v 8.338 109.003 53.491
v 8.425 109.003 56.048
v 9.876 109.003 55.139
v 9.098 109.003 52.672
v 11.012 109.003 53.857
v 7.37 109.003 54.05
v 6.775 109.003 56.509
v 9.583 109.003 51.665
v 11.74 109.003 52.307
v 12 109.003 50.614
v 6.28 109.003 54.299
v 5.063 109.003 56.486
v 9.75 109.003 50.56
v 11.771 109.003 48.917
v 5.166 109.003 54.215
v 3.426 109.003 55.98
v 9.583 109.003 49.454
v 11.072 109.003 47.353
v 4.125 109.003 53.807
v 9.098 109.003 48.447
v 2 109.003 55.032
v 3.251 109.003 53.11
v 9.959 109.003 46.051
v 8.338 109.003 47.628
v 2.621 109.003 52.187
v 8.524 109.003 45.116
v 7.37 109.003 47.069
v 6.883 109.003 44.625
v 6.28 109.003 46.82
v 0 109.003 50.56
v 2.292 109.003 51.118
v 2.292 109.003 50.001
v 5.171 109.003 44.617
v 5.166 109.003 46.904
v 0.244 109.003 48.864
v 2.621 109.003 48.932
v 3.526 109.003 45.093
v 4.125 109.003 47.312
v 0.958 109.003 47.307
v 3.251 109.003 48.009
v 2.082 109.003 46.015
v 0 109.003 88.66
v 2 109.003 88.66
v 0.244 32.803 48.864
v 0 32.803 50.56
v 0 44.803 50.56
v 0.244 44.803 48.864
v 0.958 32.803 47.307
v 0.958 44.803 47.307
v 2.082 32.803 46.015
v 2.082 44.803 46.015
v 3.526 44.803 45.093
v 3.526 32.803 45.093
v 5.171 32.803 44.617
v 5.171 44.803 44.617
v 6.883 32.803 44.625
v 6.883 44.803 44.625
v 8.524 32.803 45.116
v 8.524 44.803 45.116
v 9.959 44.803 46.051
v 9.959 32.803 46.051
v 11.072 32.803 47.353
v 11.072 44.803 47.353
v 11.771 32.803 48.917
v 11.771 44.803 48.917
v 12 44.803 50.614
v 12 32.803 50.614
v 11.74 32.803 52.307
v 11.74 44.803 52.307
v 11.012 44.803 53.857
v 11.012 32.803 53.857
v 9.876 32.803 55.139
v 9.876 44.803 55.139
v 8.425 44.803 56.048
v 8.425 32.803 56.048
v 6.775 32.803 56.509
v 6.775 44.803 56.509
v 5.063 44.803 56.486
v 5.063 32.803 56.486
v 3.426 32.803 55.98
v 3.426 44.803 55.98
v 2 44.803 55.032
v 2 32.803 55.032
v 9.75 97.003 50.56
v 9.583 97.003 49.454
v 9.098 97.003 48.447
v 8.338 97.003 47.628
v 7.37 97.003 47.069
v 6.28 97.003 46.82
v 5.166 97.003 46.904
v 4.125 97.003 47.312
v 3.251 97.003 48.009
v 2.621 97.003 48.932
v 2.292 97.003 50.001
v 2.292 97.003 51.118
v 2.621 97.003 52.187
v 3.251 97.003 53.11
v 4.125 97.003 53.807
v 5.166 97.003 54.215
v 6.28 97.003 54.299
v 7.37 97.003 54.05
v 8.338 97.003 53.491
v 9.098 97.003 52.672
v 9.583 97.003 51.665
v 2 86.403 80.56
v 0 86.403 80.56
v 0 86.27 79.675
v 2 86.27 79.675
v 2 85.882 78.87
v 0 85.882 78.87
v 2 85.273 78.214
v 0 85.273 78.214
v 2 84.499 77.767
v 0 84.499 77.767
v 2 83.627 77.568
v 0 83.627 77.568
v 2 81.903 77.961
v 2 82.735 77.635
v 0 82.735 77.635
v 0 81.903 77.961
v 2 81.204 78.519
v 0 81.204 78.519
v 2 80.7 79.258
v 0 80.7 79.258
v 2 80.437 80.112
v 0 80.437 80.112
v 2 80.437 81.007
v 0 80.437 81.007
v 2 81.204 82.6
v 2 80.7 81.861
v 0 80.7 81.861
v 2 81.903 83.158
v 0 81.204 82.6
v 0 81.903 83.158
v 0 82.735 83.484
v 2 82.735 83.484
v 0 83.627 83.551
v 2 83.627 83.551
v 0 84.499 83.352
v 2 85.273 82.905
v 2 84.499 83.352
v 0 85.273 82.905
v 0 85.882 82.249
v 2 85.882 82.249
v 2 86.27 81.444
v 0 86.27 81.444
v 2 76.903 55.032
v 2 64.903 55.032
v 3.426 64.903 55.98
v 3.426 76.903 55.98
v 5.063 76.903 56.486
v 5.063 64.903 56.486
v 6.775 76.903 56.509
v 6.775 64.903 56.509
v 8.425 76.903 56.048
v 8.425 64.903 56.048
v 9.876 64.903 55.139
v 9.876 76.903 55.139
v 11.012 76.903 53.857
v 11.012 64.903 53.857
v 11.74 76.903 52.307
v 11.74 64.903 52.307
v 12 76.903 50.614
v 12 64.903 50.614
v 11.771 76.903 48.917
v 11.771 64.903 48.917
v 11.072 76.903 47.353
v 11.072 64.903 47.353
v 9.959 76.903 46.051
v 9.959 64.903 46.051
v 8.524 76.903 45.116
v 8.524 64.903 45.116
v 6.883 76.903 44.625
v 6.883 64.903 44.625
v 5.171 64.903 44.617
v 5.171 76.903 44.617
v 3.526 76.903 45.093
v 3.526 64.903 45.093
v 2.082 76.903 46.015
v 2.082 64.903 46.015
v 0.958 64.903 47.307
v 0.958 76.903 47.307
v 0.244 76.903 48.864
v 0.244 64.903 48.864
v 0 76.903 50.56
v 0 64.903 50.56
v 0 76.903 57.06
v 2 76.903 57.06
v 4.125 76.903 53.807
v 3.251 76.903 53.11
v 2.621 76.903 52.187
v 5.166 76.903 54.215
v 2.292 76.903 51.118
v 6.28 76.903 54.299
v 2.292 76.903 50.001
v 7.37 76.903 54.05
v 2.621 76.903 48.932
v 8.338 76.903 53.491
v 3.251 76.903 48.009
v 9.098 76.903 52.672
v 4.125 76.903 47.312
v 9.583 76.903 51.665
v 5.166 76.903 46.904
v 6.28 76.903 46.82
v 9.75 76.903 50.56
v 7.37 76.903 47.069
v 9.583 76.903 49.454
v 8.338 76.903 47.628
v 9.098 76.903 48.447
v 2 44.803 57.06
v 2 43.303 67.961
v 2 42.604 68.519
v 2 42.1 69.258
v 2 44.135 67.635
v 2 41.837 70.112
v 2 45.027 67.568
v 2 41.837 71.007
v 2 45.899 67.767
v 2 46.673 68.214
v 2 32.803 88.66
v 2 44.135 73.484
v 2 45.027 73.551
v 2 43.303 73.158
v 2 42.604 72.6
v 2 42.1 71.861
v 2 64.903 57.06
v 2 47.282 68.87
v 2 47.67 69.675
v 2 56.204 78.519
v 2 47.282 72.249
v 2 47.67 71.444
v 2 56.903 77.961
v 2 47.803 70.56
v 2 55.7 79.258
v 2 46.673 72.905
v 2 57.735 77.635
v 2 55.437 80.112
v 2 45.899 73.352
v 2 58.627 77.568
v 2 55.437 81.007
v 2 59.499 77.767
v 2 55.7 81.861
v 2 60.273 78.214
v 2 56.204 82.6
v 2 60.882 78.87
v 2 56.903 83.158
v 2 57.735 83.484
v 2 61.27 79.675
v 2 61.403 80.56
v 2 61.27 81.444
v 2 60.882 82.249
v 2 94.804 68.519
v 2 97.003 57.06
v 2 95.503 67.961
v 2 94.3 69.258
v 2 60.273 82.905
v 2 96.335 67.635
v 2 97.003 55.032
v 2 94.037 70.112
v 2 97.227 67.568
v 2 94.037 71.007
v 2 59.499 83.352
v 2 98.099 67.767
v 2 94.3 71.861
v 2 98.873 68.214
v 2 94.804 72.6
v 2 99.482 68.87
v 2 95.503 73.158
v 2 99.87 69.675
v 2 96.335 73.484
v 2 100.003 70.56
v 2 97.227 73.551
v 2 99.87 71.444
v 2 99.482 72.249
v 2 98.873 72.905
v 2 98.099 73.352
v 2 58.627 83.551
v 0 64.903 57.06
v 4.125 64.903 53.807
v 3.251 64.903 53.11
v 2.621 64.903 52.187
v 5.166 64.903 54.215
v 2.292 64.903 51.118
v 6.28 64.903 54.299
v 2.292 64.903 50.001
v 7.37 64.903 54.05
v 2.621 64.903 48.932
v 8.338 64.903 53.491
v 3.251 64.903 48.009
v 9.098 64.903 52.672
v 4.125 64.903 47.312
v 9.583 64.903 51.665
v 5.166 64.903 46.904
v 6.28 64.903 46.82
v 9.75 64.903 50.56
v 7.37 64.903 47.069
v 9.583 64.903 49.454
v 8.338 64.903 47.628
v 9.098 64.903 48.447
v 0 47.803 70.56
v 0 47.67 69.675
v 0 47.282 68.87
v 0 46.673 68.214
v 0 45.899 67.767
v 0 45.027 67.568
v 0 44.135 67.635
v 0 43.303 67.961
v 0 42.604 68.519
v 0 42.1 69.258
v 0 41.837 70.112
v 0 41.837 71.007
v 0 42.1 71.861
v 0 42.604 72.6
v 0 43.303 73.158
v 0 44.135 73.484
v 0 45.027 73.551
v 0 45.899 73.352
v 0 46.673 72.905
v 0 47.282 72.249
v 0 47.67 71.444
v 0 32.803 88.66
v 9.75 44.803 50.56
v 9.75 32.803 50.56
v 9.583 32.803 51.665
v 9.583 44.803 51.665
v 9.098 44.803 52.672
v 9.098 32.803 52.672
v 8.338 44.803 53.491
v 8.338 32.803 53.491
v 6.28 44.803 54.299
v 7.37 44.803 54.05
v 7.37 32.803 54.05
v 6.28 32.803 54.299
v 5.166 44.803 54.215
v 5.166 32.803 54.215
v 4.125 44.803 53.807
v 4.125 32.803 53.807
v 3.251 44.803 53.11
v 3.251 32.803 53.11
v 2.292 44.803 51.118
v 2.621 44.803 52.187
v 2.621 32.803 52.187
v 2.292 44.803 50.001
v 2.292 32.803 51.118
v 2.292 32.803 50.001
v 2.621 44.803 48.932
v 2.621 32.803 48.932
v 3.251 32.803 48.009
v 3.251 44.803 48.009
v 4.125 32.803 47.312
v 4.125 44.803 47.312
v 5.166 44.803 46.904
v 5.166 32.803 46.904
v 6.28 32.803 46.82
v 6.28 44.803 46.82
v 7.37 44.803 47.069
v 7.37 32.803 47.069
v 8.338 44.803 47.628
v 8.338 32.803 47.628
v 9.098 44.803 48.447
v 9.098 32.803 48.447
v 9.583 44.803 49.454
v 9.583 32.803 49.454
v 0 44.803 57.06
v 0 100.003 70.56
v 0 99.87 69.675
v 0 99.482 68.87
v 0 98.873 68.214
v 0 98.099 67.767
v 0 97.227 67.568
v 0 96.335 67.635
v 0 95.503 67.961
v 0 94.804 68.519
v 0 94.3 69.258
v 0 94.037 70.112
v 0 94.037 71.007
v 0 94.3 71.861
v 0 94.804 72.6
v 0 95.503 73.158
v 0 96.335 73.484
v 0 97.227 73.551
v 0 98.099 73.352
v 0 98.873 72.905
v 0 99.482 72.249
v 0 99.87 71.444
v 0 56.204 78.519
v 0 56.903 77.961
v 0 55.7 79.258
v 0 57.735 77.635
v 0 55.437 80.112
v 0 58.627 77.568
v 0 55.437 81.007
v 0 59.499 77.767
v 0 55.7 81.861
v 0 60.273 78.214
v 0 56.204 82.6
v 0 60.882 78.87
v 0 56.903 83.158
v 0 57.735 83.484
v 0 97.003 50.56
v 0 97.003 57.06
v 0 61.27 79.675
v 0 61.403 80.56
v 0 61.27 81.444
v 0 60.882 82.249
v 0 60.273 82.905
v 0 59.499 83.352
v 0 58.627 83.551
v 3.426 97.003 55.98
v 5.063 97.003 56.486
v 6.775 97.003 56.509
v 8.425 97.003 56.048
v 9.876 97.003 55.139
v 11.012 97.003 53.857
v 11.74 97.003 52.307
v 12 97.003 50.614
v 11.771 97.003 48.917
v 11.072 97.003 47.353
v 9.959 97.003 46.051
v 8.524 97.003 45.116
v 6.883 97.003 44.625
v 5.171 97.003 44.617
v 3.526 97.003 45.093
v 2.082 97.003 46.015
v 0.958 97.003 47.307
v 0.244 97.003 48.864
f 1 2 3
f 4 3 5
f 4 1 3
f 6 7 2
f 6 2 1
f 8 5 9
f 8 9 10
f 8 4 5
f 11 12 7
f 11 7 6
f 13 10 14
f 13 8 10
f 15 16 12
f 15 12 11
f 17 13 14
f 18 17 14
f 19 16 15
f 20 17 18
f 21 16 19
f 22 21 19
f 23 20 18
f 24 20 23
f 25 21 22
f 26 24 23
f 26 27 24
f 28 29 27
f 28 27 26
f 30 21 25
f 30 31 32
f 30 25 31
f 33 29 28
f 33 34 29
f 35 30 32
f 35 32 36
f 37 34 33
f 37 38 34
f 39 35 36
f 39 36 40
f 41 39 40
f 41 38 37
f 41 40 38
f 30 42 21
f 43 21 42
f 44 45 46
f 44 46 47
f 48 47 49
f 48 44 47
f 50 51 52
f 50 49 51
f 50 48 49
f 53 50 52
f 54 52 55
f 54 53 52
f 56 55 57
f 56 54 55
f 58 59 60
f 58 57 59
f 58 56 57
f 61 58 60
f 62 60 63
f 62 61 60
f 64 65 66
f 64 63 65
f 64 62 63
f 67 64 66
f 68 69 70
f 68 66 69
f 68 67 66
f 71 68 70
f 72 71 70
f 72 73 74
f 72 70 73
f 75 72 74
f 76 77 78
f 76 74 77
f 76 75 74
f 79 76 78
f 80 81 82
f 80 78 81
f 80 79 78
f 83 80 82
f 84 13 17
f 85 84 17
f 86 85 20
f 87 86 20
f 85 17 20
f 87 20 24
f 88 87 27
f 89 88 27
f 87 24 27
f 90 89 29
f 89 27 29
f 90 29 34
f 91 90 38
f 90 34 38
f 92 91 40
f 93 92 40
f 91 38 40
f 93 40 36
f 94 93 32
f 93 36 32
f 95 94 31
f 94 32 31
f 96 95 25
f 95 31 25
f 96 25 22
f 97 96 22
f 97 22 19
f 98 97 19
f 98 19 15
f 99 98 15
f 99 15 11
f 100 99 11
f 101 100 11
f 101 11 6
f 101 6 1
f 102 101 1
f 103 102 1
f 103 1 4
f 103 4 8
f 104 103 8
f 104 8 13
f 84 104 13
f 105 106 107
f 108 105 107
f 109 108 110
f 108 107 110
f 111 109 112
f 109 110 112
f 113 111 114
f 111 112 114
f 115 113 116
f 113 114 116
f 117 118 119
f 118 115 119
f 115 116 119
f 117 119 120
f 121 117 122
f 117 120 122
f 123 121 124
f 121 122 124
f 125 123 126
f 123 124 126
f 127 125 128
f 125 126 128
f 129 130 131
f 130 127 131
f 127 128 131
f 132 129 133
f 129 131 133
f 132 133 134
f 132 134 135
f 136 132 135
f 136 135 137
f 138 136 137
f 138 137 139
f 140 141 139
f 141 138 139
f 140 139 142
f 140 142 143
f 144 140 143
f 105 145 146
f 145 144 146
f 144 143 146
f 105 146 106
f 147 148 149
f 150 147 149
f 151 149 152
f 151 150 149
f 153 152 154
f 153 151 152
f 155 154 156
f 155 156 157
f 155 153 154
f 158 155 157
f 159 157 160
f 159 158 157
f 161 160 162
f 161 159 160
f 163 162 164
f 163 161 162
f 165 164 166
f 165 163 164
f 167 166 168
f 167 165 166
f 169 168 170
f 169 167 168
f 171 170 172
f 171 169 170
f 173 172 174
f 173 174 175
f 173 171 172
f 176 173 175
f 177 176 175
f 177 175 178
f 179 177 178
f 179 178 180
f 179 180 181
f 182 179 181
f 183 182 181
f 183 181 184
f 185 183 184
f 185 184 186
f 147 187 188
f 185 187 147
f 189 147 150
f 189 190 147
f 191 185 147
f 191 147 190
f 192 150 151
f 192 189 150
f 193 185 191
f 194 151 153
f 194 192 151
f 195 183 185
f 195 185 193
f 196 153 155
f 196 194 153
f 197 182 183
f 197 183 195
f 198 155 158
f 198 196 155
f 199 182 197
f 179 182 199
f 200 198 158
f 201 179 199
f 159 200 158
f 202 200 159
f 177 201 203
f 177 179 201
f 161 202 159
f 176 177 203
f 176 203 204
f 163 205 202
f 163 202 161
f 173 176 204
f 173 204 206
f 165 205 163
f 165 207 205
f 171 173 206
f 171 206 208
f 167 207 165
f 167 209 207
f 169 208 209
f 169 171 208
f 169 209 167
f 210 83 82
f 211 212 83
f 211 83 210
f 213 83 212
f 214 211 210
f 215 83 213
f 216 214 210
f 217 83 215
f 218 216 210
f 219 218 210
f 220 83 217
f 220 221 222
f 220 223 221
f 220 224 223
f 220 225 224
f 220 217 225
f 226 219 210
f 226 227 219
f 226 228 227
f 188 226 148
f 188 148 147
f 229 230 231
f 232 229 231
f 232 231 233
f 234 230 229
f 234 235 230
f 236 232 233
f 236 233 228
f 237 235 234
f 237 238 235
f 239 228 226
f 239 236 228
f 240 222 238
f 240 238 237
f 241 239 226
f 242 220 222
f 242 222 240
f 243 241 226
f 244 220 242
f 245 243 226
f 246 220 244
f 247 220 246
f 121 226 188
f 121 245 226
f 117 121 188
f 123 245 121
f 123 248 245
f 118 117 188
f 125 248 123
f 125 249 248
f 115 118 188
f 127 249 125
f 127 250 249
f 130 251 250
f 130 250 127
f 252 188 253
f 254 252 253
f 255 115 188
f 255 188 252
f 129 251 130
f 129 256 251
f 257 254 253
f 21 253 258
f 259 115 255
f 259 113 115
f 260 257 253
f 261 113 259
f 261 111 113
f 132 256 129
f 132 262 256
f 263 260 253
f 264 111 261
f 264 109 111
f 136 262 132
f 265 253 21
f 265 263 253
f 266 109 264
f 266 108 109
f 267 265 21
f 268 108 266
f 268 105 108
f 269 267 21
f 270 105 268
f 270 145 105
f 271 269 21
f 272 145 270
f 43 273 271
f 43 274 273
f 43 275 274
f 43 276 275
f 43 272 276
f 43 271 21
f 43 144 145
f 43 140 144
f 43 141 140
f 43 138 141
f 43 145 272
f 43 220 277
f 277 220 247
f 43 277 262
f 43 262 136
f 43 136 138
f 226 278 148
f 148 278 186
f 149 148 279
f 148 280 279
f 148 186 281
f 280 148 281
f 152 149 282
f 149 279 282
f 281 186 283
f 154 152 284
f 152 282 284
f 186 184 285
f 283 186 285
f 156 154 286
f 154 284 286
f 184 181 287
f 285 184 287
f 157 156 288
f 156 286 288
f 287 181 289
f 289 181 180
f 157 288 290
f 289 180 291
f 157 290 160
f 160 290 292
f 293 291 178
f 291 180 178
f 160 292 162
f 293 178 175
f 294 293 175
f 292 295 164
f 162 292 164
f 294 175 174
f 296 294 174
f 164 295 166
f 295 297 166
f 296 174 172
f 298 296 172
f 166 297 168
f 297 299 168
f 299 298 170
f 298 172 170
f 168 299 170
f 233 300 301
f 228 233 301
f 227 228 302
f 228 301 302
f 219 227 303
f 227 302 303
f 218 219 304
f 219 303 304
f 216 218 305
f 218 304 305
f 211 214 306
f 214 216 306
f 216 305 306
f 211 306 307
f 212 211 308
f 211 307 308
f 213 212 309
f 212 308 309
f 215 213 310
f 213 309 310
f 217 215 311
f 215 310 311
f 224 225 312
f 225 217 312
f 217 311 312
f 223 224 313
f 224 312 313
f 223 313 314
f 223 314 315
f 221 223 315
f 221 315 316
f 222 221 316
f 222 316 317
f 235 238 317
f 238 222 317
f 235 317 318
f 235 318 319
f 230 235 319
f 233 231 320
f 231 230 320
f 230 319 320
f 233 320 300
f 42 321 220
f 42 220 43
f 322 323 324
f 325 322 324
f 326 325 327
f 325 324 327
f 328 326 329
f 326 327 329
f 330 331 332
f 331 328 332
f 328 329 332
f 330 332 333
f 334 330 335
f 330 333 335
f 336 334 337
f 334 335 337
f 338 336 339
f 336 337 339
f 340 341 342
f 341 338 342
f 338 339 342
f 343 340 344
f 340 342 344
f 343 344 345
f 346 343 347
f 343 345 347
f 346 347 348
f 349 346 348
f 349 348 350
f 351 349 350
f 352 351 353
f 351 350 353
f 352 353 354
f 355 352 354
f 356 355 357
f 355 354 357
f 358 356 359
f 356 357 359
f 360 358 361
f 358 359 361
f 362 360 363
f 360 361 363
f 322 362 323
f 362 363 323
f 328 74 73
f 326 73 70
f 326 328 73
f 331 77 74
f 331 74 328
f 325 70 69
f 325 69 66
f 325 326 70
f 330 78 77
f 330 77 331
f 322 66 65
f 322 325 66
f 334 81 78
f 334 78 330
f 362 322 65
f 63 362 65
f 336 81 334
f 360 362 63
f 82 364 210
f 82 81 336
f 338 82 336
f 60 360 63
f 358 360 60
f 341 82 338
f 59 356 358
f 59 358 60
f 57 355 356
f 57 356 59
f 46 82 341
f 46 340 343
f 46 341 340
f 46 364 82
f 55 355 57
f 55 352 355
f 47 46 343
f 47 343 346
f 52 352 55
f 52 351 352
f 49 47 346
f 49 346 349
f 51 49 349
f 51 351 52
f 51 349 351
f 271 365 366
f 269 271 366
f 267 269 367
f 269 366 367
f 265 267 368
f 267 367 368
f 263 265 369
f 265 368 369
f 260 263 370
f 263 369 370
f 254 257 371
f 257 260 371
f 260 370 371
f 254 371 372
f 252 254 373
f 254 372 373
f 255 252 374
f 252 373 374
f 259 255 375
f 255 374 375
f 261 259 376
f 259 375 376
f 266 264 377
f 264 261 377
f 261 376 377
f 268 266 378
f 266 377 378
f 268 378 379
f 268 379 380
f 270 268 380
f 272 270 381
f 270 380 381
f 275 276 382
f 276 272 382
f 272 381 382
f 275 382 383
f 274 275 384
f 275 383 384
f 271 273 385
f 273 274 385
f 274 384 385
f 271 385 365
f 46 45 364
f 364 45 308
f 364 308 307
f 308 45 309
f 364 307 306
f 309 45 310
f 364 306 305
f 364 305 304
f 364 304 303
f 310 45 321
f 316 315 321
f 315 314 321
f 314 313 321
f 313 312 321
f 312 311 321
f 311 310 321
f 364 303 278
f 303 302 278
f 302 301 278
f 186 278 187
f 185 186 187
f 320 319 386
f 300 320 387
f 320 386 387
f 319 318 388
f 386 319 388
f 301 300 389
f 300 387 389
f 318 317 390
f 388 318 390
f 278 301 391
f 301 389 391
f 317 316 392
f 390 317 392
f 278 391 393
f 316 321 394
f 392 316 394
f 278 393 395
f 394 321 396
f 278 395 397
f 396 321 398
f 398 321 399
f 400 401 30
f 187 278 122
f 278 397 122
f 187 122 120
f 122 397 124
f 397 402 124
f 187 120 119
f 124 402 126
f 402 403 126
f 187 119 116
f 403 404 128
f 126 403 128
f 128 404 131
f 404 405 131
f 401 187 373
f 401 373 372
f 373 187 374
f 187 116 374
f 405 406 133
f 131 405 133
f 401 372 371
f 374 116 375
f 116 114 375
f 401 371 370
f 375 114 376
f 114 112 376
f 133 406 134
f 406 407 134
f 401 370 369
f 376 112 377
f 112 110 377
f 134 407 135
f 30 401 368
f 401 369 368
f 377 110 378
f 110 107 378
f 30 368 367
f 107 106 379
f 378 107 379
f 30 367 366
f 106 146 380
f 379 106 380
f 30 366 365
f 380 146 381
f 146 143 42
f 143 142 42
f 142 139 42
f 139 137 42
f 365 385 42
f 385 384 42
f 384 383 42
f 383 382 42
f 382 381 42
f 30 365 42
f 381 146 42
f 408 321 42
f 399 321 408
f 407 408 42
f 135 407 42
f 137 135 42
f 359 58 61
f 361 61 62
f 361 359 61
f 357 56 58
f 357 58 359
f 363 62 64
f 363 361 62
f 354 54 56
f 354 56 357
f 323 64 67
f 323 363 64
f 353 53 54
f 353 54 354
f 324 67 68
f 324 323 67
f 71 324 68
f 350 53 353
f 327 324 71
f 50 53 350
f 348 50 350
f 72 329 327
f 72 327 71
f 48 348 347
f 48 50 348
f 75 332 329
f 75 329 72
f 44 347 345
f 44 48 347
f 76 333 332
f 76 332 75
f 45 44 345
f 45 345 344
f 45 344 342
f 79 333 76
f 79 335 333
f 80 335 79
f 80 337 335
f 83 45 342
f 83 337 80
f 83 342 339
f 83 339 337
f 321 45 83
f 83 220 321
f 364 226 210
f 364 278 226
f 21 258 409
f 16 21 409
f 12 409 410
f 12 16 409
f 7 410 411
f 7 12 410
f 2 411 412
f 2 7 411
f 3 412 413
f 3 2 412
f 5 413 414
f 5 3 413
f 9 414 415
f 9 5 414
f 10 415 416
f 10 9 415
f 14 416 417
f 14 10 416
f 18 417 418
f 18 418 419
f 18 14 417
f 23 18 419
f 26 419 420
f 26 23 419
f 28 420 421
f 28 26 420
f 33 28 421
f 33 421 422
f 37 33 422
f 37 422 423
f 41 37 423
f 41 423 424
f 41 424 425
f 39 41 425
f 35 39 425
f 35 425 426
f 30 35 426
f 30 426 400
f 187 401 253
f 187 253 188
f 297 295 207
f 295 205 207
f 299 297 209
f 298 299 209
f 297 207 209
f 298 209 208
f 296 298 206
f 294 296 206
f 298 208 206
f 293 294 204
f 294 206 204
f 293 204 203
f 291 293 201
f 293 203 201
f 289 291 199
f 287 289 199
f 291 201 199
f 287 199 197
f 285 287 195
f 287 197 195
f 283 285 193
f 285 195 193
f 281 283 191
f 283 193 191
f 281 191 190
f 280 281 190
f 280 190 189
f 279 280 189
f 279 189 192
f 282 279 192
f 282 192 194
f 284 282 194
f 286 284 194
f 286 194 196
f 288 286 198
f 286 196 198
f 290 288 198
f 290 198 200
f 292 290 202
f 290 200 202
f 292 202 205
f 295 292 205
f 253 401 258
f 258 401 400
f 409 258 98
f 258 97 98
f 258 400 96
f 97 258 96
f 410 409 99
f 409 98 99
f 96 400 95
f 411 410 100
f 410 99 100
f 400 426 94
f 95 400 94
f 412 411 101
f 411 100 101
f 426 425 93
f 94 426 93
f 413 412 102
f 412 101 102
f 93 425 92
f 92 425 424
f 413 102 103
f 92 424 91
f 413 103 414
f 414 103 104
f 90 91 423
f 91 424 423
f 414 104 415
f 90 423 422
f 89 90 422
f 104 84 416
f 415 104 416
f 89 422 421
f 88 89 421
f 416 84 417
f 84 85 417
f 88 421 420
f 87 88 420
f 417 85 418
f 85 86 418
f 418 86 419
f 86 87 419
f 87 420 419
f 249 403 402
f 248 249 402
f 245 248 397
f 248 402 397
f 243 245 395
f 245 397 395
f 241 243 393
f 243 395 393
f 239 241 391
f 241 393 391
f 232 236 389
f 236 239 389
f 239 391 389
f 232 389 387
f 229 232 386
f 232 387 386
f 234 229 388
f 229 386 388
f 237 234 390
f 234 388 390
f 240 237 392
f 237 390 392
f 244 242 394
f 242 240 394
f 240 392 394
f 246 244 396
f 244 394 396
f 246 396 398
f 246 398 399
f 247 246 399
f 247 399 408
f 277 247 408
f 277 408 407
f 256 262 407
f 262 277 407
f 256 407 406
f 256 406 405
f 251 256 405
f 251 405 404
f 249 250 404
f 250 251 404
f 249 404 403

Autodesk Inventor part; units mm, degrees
ref_plane "YZ Plane" through (0, 0, 0) normal (1, 0, 0) x (0, 1, 0)
ref_plane "XZ Plane" through (0, 0, 0) normal (0, 1, 0) x (-1, 0, 0)
sketch "Sketch1" plane through (0, 0, 0) normal (1, 0, 0) x (0, 1, 0)
  line L0 (109.003, 50.5595) -> (32.803, 50.5595)
  line L1 (32.803, 50.5595) -> (32.803, 88.6595)
  line L2 (32.803, 88.6595) -> (109.003, 88.6595)
  line L3 (109.003, 88.6595) -> (109.003, 50.5595)
  line L4 (76.903, 50.5595) -> (97.003, 50.5595)
  line L5 (97.003, 50.5595) -> (97.003, 57.0595)
  line L6 (97.003, 57.0595) -> (76.903, 57.0595)
  line L7 (76.903, 57.0595) -> (76.903, 50.5595)
  line L8 (44.803, 50.5595) -> (64.903, 50.5595)
  line L9 (64.903, 50.5595) -> (64.903, 57.0595)
  line L10 (64.903, 57.0595) -> (44.803, 57.0595)
  line L11 (44.803, 57.0595) -> (44.803, 50.5595)
  circle A0 centre (97.003, 70.5595) radius 3
  circle A1 centre (83.403, 80.5595) radius 3
  line L12 (70.903, 88.6595) -> (70.903, 50.5595) construction
  circle A2 centre (44.803, 70.5595) radius 3
  circle A3 centre (58.403, 80.5595) radius 3
  point P0 (0, 0)
  dimension "d0" = 76.2
  dimension "d1" = 38.1
  dimension "d2" = 6.5
  dimension "d4" = 12
  dimension "d5" = 12
  dimension "d6" = 12
  dimension "d7" = 6
  dimension "d8" = 6
  dimension "d9" = 20
  dimension "d10" = 30
  dimension "d11" = 12.5
  dimension "d12" = 26.1
extrude "Extrusion1" add sketch "Sketch1" along normal blind 2 contours L0 L5 L6 L7 L9 L10 L11 L1 L2 L3
ref_plane "Work Plane1" through (2, 70.903, 50.5595) normal (0, 1, 0) x (-1, 0, 0)
sketch "Sketch2" plane through (0, 109.003, 88.6595) normal (0, 1, 0) x (1, 0, 0)
  line L0 (0, 38.1) -> (0, 0) projected
  line L1 (0, 0) -> (2, 0) projected
  line L2 (2, 38.1) -> (2, 0) projected
  line L3 (0, 38.1) -> (2, 38.1) projected
  circle A0 centre (6, 38.1) radius 6
  line L4 (0, 38.1) -> (2, 38.1) projected
  line L5 (0, 38.1) -> (2, 38.1)
  circle A1 centre (6, 38.1) radius 3.75
  point P0 (0, 88.6595)
  point P1 (1.2193, 34.4744)
  point P2 (0, 38.1)
  dimension "d15" = 0
  dimension "d16" = 12
  dimension "d18" = 7.5
  dimension "d23" = 4
extrude "Extrusion2" add sketch "Sketch2" against normal up to surface (12 mm away) contours A0 L2 L3 | L3 L2 A0
mirror "Mirror1" about plane through (2, 70.903, 50.5595) normal (0, 1, 0) of "Extrusion2"
sketch "Sketch3" plane through (0, 76.903, 57.0595) normal (0, 1, 0) x (1, 0, 0)
  line L0 (0, -31.6) -> (2, -31.6) projected
  line L1 (0, 6.5) -> (2, 6.5) projected
  line L2 (0, 6.5) -> (2, 6.5)
  line L3 (0, 6.5) -> (0, -31.6) projected
  line L4 (2, 2.0279) -> (2, -31.6) projected
  arc A0 (2, 2.0279) -> (0, 6.5) centre (6, 6.5) ccw projected
  circle A1 centre (6, 6.5) radius 3.75 projected
  circle A2 centre (6, 6.5) radius 3.75 projected
  line L5 (0, 6.5) -> (0, -31.6) projected
  line L6 (0, -31.6) -> (2, -31.6) projected
  line L7 (2, 2.0279) -> (2, -31.6) projected
  arc A3 (2, 2.0279) -> (0, 6.5) centre (6, 6.5) ccw projected
  line L8 (2, 6.5) -> (2, 0) projected
  point P0 (0, 57.0595)
extrude "Extrusion3" add sketch "Sketch3" against normal up to surface (12 mm away) contours A0 L8 L1
equation "\"d5\" = d4"
equation "\"d6\" = d4"
equation "\"d8\" = d7"
properties part number "zawias-lewy" material "Stainless Steel"
